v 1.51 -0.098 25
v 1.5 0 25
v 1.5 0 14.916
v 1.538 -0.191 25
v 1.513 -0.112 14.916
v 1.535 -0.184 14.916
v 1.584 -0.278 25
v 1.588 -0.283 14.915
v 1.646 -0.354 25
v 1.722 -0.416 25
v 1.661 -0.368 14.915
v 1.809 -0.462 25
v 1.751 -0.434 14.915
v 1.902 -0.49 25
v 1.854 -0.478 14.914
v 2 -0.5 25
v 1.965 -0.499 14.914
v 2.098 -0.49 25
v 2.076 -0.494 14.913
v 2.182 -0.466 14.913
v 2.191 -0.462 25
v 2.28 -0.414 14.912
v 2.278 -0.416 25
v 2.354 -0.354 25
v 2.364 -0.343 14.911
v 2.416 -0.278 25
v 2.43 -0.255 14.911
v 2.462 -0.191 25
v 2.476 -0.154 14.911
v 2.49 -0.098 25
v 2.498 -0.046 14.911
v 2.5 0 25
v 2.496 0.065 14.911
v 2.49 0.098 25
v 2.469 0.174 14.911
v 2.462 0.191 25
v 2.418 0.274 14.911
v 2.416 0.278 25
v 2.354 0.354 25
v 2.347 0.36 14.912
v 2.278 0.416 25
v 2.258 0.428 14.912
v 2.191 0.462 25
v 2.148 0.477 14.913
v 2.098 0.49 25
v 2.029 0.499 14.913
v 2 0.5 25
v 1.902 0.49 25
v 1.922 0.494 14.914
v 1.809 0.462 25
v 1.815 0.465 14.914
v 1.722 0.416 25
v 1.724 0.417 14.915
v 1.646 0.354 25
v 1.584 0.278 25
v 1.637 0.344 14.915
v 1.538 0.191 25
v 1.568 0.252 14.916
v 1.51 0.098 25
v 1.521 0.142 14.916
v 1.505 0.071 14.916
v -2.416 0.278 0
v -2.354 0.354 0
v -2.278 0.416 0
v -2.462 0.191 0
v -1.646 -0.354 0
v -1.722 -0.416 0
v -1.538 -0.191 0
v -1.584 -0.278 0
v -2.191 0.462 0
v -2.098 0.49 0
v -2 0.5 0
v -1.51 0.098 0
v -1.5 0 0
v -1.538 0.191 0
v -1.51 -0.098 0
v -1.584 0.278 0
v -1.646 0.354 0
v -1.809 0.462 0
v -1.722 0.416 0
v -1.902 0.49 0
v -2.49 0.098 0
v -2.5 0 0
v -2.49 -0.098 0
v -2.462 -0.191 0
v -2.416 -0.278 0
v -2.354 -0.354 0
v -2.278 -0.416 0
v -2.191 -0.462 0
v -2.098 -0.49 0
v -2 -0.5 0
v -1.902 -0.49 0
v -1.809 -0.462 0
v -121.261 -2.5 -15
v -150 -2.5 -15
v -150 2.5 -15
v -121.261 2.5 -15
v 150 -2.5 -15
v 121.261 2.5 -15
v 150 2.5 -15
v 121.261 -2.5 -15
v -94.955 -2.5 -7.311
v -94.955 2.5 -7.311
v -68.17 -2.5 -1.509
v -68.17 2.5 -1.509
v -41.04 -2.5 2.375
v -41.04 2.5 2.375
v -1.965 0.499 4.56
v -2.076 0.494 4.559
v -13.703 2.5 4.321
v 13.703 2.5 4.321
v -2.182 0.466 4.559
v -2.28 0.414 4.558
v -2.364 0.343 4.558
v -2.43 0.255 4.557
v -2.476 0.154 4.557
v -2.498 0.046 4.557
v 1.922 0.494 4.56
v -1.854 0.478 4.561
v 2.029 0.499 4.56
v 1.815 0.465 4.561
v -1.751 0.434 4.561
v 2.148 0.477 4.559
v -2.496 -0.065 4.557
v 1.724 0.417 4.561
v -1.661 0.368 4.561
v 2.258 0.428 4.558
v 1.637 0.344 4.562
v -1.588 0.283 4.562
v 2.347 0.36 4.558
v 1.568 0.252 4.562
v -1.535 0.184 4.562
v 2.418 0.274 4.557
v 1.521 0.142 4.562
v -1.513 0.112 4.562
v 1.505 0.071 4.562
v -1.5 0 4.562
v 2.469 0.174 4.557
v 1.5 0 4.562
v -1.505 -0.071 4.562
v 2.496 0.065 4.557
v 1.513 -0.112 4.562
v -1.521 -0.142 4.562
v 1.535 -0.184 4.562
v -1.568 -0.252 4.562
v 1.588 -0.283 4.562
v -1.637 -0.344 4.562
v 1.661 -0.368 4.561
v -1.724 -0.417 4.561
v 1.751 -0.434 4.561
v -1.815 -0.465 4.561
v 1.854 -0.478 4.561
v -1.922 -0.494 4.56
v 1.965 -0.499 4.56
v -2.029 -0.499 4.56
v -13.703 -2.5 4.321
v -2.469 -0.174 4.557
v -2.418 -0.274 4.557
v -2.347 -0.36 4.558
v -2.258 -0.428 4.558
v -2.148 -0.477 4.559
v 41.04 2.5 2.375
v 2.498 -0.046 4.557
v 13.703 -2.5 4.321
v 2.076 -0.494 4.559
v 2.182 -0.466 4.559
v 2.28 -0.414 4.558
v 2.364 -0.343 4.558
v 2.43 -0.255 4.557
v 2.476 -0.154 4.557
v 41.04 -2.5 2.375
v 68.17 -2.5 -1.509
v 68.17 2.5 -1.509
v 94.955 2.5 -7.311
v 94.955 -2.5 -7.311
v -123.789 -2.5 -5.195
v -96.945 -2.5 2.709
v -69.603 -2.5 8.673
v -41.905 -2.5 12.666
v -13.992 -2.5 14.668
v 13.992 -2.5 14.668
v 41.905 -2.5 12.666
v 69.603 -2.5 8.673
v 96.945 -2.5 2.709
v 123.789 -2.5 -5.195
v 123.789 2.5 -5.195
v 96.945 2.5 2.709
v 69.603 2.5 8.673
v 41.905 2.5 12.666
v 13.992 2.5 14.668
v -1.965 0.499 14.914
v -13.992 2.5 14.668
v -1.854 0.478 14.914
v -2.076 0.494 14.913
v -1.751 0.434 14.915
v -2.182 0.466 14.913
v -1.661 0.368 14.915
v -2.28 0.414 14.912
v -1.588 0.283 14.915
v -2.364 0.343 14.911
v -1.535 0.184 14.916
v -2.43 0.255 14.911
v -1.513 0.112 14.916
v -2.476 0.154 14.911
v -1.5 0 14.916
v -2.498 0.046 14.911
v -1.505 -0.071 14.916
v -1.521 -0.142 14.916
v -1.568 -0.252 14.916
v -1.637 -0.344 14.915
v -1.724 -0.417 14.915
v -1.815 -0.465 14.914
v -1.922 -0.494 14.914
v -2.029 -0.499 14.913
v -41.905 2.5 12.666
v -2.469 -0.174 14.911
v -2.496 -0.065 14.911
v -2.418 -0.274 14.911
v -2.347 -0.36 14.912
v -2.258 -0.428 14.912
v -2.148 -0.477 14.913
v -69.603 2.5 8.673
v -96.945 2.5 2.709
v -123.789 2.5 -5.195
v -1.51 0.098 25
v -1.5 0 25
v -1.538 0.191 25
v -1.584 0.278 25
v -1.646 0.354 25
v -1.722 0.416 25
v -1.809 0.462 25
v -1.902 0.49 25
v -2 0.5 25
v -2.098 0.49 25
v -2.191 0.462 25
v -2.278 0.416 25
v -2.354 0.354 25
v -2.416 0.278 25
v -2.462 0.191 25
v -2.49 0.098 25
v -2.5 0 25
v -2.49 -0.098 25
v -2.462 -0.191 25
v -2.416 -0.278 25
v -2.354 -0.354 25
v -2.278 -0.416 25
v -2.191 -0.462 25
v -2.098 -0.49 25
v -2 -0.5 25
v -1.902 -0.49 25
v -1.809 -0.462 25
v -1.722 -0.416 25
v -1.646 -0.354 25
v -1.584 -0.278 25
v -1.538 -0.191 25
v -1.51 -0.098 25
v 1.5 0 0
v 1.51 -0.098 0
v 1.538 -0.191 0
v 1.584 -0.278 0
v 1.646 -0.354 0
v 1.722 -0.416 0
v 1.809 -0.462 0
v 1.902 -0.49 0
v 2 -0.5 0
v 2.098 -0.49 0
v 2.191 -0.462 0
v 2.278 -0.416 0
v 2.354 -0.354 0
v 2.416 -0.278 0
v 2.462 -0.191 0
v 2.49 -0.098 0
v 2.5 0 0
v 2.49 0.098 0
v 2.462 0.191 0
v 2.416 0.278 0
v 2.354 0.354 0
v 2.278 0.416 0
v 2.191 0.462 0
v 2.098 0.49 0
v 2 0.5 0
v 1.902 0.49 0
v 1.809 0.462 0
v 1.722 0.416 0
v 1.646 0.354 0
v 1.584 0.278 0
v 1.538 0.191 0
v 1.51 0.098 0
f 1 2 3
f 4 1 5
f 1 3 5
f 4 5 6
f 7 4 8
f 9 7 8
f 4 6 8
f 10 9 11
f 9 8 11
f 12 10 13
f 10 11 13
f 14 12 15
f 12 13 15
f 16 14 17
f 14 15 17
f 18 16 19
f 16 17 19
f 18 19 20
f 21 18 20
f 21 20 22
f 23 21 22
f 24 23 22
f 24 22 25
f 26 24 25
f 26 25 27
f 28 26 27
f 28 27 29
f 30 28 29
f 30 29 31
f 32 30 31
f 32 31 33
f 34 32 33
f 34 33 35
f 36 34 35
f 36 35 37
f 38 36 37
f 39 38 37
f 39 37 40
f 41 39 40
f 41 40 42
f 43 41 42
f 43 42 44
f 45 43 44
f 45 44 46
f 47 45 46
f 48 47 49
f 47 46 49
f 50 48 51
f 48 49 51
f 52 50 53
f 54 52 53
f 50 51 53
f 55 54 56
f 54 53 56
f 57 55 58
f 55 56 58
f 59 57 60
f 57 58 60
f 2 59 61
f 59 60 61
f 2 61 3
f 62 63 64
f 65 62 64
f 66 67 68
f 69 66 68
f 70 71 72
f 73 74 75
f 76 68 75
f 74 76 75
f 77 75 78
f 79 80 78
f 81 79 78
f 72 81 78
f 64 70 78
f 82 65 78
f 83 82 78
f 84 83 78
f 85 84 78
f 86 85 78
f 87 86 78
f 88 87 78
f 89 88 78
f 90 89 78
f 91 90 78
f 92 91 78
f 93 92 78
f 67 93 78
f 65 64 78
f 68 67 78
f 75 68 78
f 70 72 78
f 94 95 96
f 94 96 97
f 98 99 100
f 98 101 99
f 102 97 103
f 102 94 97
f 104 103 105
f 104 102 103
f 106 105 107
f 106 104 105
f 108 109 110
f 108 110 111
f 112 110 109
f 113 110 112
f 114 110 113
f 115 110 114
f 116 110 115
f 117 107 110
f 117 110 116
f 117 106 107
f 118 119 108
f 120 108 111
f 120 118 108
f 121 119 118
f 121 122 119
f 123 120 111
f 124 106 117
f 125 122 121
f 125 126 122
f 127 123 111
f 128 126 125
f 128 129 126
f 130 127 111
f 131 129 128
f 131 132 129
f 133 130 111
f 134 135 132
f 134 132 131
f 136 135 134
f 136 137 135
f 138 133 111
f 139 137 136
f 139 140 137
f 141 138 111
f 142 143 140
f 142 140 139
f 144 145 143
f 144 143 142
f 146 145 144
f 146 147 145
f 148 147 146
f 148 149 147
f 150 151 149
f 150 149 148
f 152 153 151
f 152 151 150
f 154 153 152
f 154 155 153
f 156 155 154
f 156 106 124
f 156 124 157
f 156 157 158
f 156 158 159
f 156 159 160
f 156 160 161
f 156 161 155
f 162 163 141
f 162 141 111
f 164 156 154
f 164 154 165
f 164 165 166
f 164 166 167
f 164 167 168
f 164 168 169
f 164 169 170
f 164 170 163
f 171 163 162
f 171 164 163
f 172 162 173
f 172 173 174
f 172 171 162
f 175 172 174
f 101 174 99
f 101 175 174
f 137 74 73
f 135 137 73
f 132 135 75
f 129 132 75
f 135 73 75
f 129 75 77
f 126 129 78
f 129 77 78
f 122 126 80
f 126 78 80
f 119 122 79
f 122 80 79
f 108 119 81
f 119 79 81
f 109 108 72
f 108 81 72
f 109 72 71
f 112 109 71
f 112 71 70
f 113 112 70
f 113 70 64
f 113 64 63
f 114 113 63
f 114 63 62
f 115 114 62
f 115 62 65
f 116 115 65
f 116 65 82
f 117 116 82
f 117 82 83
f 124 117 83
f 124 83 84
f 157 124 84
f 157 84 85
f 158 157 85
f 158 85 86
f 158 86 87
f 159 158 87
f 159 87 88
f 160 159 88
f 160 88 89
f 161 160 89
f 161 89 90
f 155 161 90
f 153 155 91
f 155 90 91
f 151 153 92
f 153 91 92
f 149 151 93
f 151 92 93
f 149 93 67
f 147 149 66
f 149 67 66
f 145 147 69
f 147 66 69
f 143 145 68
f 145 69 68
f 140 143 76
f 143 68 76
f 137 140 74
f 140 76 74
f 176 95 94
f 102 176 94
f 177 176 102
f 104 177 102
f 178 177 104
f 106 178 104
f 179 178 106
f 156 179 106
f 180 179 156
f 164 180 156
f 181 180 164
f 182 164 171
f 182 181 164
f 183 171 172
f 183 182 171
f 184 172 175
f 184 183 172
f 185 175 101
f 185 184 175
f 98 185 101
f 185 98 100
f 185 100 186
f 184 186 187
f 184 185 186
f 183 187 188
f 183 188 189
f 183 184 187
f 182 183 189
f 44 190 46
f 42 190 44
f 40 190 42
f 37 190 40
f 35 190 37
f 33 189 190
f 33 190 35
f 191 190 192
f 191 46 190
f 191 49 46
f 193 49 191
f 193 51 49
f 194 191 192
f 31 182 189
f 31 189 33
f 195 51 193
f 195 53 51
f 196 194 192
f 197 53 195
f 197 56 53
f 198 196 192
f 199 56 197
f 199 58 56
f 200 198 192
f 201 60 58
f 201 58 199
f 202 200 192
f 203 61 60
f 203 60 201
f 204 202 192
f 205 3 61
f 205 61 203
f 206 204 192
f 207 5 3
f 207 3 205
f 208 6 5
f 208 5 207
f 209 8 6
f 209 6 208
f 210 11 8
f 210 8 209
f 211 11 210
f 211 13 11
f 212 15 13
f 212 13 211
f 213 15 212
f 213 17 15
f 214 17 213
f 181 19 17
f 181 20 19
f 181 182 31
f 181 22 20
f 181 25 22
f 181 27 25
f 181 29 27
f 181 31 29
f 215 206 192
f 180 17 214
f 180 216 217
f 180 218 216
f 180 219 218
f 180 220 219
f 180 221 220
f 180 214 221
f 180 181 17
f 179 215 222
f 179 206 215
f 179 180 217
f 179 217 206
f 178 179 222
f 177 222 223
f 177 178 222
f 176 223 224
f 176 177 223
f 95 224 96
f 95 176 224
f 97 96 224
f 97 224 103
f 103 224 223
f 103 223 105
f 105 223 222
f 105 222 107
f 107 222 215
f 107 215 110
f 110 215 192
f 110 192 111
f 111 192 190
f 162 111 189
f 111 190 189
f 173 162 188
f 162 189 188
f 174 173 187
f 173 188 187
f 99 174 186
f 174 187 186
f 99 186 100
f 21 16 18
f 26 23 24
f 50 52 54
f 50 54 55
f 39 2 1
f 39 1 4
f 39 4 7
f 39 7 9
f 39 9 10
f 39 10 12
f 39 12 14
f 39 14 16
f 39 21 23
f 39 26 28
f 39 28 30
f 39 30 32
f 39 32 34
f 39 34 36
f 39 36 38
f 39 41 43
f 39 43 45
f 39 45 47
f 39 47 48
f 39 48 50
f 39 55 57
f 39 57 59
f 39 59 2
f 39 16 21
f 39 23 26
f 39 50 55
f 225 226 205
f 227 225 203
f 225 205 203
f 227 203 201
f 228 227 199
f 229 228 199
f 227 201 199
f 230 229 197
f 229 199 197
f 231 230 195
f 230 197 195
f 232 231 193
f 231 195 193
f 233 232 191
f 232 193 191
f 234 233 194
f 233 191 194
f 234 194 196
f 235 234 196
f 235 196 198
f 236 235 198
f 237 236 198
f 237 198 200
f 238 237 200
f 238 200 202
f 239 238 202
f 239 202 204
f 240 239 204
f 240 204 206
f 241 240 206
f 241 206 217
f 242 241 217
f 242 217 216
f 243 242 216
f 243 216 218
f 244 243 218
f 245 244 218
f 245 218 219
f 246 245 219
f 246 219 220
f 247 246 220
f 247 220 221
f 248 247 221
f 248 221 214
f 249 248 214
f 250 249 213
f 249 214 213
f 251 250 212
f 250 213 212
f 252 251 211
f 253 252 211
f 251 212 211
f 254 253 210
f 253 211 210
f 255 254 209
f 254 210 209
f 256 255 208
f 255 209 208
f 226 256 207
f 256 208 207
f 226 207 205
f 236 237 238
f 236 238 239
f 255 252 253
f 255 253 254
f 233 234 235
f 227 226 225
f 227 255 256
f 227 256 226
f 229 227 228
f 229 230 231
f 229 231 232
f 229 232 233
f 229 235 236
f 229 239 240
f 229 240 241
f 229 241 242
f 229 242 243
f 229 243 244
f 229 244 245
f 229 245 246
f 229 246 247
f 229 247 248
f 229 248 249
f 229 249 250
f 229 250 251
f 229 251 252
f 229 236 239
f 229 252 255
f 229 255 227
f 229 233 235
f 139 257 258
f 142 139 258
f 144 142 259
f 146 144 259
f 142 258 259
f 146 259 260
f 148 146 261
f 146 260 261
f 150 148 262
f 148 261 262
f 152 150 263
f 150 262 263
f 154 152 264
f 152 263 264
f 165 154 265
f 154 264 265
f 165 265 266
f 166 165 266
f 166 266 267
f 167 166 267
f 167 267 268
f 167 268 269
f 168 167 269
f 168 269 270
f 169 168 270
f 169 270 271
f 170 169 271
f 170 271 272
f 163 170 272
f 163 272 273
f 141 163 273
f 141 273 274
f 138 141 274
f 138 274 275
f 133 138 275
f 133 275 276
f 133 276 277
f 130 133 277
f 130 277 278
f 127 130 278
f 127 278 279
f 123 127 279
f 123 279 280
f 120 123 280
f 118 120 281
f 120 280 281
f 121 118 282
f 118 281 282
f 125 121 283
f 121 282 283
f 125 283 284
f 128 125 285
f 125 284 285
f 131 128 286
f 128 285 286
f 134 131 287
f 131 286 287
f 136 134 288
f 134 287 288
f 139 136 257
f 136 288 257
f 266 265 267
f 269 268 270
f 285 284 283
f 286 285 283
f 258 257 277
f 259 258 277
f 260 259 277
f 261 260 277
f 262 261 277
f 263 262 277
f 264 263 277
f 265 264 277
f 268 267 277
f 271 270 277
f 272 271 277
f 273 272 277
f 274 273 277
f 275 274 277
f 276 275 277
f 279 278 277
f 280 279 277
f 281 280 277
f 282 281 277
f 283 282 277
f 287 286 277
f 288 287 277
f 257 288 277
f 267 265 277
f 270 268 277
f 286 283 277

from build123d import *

# Parameters (mm, degrees)
F1_DEPTH = 2.5
F2_R     = 0.5
F3_DEPTH = 25


with BuildPart() as f1:
    # F0 (on Front) → F1 (new body, symmetric)
    with BuildSketch(Plane.XZ):
        with BuildLine():
            Line((121.261015, -15), (150, -15))
            ThreePointArc((150, -15), (0, 14.918645), (-150, -15))
            Line((-150, -15), (-121.261015, -15))
            ThreePointArc((-121.261015, -15), (0, 4.565027), (121.261015, -15))
        make_face()
    extrude(amount=F1_DEPTH, both=True)

    # F2 (on Top) → F3 (join)
    with BuildSketch(Plane.XY):
        with Locations((-2, 0)):
            Circle(F2_R)
        with BuildLine():
            ThreePointArc((2.5, 0), (2, 0.5), (1.5, 0))
            ThreePointArc((1.5, 0), (2, -0.5), (2.5, 0))
        make_face()
    extrude(amount=F3_DEPTH)


solid = f1.part
